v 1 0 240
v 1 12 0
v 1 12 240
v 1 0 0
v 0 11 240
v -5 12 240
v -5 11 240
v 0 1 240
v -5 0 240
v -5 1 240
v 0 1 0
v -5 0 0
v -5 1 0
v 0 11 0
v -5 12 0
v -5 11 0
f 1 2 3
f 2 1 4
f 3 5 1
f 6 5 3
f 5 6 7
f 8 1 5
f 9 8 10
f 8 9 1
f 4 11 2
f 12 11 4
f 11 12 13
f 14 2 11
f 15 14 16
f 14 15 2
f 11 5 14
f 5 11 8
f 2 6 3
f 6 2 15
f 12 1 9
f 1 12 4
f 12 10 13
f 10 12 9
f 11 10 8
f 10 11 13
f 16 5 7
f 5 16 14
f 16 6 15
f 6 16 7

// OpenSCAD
/**
 * height - beam height
 * length - beam length
 * thickness - material thickness
 * width - beam width
 */
module uBeam(height,width,length,thickness) {
  union() {
    cube([thickness,width,length]);
    translate([thickness,0,0]) rotate([0,0,90]) cube([thickness,height,length]);
    translate([thickness, width - thickness,0]) rotate([0,0,90]) cube([thickness, height,length]);
      
   // translate([0,thickness,0]) cube([height - thickness, width -  2 * thickness, length]);
  }
}

uBeam(6,12,240,1);
